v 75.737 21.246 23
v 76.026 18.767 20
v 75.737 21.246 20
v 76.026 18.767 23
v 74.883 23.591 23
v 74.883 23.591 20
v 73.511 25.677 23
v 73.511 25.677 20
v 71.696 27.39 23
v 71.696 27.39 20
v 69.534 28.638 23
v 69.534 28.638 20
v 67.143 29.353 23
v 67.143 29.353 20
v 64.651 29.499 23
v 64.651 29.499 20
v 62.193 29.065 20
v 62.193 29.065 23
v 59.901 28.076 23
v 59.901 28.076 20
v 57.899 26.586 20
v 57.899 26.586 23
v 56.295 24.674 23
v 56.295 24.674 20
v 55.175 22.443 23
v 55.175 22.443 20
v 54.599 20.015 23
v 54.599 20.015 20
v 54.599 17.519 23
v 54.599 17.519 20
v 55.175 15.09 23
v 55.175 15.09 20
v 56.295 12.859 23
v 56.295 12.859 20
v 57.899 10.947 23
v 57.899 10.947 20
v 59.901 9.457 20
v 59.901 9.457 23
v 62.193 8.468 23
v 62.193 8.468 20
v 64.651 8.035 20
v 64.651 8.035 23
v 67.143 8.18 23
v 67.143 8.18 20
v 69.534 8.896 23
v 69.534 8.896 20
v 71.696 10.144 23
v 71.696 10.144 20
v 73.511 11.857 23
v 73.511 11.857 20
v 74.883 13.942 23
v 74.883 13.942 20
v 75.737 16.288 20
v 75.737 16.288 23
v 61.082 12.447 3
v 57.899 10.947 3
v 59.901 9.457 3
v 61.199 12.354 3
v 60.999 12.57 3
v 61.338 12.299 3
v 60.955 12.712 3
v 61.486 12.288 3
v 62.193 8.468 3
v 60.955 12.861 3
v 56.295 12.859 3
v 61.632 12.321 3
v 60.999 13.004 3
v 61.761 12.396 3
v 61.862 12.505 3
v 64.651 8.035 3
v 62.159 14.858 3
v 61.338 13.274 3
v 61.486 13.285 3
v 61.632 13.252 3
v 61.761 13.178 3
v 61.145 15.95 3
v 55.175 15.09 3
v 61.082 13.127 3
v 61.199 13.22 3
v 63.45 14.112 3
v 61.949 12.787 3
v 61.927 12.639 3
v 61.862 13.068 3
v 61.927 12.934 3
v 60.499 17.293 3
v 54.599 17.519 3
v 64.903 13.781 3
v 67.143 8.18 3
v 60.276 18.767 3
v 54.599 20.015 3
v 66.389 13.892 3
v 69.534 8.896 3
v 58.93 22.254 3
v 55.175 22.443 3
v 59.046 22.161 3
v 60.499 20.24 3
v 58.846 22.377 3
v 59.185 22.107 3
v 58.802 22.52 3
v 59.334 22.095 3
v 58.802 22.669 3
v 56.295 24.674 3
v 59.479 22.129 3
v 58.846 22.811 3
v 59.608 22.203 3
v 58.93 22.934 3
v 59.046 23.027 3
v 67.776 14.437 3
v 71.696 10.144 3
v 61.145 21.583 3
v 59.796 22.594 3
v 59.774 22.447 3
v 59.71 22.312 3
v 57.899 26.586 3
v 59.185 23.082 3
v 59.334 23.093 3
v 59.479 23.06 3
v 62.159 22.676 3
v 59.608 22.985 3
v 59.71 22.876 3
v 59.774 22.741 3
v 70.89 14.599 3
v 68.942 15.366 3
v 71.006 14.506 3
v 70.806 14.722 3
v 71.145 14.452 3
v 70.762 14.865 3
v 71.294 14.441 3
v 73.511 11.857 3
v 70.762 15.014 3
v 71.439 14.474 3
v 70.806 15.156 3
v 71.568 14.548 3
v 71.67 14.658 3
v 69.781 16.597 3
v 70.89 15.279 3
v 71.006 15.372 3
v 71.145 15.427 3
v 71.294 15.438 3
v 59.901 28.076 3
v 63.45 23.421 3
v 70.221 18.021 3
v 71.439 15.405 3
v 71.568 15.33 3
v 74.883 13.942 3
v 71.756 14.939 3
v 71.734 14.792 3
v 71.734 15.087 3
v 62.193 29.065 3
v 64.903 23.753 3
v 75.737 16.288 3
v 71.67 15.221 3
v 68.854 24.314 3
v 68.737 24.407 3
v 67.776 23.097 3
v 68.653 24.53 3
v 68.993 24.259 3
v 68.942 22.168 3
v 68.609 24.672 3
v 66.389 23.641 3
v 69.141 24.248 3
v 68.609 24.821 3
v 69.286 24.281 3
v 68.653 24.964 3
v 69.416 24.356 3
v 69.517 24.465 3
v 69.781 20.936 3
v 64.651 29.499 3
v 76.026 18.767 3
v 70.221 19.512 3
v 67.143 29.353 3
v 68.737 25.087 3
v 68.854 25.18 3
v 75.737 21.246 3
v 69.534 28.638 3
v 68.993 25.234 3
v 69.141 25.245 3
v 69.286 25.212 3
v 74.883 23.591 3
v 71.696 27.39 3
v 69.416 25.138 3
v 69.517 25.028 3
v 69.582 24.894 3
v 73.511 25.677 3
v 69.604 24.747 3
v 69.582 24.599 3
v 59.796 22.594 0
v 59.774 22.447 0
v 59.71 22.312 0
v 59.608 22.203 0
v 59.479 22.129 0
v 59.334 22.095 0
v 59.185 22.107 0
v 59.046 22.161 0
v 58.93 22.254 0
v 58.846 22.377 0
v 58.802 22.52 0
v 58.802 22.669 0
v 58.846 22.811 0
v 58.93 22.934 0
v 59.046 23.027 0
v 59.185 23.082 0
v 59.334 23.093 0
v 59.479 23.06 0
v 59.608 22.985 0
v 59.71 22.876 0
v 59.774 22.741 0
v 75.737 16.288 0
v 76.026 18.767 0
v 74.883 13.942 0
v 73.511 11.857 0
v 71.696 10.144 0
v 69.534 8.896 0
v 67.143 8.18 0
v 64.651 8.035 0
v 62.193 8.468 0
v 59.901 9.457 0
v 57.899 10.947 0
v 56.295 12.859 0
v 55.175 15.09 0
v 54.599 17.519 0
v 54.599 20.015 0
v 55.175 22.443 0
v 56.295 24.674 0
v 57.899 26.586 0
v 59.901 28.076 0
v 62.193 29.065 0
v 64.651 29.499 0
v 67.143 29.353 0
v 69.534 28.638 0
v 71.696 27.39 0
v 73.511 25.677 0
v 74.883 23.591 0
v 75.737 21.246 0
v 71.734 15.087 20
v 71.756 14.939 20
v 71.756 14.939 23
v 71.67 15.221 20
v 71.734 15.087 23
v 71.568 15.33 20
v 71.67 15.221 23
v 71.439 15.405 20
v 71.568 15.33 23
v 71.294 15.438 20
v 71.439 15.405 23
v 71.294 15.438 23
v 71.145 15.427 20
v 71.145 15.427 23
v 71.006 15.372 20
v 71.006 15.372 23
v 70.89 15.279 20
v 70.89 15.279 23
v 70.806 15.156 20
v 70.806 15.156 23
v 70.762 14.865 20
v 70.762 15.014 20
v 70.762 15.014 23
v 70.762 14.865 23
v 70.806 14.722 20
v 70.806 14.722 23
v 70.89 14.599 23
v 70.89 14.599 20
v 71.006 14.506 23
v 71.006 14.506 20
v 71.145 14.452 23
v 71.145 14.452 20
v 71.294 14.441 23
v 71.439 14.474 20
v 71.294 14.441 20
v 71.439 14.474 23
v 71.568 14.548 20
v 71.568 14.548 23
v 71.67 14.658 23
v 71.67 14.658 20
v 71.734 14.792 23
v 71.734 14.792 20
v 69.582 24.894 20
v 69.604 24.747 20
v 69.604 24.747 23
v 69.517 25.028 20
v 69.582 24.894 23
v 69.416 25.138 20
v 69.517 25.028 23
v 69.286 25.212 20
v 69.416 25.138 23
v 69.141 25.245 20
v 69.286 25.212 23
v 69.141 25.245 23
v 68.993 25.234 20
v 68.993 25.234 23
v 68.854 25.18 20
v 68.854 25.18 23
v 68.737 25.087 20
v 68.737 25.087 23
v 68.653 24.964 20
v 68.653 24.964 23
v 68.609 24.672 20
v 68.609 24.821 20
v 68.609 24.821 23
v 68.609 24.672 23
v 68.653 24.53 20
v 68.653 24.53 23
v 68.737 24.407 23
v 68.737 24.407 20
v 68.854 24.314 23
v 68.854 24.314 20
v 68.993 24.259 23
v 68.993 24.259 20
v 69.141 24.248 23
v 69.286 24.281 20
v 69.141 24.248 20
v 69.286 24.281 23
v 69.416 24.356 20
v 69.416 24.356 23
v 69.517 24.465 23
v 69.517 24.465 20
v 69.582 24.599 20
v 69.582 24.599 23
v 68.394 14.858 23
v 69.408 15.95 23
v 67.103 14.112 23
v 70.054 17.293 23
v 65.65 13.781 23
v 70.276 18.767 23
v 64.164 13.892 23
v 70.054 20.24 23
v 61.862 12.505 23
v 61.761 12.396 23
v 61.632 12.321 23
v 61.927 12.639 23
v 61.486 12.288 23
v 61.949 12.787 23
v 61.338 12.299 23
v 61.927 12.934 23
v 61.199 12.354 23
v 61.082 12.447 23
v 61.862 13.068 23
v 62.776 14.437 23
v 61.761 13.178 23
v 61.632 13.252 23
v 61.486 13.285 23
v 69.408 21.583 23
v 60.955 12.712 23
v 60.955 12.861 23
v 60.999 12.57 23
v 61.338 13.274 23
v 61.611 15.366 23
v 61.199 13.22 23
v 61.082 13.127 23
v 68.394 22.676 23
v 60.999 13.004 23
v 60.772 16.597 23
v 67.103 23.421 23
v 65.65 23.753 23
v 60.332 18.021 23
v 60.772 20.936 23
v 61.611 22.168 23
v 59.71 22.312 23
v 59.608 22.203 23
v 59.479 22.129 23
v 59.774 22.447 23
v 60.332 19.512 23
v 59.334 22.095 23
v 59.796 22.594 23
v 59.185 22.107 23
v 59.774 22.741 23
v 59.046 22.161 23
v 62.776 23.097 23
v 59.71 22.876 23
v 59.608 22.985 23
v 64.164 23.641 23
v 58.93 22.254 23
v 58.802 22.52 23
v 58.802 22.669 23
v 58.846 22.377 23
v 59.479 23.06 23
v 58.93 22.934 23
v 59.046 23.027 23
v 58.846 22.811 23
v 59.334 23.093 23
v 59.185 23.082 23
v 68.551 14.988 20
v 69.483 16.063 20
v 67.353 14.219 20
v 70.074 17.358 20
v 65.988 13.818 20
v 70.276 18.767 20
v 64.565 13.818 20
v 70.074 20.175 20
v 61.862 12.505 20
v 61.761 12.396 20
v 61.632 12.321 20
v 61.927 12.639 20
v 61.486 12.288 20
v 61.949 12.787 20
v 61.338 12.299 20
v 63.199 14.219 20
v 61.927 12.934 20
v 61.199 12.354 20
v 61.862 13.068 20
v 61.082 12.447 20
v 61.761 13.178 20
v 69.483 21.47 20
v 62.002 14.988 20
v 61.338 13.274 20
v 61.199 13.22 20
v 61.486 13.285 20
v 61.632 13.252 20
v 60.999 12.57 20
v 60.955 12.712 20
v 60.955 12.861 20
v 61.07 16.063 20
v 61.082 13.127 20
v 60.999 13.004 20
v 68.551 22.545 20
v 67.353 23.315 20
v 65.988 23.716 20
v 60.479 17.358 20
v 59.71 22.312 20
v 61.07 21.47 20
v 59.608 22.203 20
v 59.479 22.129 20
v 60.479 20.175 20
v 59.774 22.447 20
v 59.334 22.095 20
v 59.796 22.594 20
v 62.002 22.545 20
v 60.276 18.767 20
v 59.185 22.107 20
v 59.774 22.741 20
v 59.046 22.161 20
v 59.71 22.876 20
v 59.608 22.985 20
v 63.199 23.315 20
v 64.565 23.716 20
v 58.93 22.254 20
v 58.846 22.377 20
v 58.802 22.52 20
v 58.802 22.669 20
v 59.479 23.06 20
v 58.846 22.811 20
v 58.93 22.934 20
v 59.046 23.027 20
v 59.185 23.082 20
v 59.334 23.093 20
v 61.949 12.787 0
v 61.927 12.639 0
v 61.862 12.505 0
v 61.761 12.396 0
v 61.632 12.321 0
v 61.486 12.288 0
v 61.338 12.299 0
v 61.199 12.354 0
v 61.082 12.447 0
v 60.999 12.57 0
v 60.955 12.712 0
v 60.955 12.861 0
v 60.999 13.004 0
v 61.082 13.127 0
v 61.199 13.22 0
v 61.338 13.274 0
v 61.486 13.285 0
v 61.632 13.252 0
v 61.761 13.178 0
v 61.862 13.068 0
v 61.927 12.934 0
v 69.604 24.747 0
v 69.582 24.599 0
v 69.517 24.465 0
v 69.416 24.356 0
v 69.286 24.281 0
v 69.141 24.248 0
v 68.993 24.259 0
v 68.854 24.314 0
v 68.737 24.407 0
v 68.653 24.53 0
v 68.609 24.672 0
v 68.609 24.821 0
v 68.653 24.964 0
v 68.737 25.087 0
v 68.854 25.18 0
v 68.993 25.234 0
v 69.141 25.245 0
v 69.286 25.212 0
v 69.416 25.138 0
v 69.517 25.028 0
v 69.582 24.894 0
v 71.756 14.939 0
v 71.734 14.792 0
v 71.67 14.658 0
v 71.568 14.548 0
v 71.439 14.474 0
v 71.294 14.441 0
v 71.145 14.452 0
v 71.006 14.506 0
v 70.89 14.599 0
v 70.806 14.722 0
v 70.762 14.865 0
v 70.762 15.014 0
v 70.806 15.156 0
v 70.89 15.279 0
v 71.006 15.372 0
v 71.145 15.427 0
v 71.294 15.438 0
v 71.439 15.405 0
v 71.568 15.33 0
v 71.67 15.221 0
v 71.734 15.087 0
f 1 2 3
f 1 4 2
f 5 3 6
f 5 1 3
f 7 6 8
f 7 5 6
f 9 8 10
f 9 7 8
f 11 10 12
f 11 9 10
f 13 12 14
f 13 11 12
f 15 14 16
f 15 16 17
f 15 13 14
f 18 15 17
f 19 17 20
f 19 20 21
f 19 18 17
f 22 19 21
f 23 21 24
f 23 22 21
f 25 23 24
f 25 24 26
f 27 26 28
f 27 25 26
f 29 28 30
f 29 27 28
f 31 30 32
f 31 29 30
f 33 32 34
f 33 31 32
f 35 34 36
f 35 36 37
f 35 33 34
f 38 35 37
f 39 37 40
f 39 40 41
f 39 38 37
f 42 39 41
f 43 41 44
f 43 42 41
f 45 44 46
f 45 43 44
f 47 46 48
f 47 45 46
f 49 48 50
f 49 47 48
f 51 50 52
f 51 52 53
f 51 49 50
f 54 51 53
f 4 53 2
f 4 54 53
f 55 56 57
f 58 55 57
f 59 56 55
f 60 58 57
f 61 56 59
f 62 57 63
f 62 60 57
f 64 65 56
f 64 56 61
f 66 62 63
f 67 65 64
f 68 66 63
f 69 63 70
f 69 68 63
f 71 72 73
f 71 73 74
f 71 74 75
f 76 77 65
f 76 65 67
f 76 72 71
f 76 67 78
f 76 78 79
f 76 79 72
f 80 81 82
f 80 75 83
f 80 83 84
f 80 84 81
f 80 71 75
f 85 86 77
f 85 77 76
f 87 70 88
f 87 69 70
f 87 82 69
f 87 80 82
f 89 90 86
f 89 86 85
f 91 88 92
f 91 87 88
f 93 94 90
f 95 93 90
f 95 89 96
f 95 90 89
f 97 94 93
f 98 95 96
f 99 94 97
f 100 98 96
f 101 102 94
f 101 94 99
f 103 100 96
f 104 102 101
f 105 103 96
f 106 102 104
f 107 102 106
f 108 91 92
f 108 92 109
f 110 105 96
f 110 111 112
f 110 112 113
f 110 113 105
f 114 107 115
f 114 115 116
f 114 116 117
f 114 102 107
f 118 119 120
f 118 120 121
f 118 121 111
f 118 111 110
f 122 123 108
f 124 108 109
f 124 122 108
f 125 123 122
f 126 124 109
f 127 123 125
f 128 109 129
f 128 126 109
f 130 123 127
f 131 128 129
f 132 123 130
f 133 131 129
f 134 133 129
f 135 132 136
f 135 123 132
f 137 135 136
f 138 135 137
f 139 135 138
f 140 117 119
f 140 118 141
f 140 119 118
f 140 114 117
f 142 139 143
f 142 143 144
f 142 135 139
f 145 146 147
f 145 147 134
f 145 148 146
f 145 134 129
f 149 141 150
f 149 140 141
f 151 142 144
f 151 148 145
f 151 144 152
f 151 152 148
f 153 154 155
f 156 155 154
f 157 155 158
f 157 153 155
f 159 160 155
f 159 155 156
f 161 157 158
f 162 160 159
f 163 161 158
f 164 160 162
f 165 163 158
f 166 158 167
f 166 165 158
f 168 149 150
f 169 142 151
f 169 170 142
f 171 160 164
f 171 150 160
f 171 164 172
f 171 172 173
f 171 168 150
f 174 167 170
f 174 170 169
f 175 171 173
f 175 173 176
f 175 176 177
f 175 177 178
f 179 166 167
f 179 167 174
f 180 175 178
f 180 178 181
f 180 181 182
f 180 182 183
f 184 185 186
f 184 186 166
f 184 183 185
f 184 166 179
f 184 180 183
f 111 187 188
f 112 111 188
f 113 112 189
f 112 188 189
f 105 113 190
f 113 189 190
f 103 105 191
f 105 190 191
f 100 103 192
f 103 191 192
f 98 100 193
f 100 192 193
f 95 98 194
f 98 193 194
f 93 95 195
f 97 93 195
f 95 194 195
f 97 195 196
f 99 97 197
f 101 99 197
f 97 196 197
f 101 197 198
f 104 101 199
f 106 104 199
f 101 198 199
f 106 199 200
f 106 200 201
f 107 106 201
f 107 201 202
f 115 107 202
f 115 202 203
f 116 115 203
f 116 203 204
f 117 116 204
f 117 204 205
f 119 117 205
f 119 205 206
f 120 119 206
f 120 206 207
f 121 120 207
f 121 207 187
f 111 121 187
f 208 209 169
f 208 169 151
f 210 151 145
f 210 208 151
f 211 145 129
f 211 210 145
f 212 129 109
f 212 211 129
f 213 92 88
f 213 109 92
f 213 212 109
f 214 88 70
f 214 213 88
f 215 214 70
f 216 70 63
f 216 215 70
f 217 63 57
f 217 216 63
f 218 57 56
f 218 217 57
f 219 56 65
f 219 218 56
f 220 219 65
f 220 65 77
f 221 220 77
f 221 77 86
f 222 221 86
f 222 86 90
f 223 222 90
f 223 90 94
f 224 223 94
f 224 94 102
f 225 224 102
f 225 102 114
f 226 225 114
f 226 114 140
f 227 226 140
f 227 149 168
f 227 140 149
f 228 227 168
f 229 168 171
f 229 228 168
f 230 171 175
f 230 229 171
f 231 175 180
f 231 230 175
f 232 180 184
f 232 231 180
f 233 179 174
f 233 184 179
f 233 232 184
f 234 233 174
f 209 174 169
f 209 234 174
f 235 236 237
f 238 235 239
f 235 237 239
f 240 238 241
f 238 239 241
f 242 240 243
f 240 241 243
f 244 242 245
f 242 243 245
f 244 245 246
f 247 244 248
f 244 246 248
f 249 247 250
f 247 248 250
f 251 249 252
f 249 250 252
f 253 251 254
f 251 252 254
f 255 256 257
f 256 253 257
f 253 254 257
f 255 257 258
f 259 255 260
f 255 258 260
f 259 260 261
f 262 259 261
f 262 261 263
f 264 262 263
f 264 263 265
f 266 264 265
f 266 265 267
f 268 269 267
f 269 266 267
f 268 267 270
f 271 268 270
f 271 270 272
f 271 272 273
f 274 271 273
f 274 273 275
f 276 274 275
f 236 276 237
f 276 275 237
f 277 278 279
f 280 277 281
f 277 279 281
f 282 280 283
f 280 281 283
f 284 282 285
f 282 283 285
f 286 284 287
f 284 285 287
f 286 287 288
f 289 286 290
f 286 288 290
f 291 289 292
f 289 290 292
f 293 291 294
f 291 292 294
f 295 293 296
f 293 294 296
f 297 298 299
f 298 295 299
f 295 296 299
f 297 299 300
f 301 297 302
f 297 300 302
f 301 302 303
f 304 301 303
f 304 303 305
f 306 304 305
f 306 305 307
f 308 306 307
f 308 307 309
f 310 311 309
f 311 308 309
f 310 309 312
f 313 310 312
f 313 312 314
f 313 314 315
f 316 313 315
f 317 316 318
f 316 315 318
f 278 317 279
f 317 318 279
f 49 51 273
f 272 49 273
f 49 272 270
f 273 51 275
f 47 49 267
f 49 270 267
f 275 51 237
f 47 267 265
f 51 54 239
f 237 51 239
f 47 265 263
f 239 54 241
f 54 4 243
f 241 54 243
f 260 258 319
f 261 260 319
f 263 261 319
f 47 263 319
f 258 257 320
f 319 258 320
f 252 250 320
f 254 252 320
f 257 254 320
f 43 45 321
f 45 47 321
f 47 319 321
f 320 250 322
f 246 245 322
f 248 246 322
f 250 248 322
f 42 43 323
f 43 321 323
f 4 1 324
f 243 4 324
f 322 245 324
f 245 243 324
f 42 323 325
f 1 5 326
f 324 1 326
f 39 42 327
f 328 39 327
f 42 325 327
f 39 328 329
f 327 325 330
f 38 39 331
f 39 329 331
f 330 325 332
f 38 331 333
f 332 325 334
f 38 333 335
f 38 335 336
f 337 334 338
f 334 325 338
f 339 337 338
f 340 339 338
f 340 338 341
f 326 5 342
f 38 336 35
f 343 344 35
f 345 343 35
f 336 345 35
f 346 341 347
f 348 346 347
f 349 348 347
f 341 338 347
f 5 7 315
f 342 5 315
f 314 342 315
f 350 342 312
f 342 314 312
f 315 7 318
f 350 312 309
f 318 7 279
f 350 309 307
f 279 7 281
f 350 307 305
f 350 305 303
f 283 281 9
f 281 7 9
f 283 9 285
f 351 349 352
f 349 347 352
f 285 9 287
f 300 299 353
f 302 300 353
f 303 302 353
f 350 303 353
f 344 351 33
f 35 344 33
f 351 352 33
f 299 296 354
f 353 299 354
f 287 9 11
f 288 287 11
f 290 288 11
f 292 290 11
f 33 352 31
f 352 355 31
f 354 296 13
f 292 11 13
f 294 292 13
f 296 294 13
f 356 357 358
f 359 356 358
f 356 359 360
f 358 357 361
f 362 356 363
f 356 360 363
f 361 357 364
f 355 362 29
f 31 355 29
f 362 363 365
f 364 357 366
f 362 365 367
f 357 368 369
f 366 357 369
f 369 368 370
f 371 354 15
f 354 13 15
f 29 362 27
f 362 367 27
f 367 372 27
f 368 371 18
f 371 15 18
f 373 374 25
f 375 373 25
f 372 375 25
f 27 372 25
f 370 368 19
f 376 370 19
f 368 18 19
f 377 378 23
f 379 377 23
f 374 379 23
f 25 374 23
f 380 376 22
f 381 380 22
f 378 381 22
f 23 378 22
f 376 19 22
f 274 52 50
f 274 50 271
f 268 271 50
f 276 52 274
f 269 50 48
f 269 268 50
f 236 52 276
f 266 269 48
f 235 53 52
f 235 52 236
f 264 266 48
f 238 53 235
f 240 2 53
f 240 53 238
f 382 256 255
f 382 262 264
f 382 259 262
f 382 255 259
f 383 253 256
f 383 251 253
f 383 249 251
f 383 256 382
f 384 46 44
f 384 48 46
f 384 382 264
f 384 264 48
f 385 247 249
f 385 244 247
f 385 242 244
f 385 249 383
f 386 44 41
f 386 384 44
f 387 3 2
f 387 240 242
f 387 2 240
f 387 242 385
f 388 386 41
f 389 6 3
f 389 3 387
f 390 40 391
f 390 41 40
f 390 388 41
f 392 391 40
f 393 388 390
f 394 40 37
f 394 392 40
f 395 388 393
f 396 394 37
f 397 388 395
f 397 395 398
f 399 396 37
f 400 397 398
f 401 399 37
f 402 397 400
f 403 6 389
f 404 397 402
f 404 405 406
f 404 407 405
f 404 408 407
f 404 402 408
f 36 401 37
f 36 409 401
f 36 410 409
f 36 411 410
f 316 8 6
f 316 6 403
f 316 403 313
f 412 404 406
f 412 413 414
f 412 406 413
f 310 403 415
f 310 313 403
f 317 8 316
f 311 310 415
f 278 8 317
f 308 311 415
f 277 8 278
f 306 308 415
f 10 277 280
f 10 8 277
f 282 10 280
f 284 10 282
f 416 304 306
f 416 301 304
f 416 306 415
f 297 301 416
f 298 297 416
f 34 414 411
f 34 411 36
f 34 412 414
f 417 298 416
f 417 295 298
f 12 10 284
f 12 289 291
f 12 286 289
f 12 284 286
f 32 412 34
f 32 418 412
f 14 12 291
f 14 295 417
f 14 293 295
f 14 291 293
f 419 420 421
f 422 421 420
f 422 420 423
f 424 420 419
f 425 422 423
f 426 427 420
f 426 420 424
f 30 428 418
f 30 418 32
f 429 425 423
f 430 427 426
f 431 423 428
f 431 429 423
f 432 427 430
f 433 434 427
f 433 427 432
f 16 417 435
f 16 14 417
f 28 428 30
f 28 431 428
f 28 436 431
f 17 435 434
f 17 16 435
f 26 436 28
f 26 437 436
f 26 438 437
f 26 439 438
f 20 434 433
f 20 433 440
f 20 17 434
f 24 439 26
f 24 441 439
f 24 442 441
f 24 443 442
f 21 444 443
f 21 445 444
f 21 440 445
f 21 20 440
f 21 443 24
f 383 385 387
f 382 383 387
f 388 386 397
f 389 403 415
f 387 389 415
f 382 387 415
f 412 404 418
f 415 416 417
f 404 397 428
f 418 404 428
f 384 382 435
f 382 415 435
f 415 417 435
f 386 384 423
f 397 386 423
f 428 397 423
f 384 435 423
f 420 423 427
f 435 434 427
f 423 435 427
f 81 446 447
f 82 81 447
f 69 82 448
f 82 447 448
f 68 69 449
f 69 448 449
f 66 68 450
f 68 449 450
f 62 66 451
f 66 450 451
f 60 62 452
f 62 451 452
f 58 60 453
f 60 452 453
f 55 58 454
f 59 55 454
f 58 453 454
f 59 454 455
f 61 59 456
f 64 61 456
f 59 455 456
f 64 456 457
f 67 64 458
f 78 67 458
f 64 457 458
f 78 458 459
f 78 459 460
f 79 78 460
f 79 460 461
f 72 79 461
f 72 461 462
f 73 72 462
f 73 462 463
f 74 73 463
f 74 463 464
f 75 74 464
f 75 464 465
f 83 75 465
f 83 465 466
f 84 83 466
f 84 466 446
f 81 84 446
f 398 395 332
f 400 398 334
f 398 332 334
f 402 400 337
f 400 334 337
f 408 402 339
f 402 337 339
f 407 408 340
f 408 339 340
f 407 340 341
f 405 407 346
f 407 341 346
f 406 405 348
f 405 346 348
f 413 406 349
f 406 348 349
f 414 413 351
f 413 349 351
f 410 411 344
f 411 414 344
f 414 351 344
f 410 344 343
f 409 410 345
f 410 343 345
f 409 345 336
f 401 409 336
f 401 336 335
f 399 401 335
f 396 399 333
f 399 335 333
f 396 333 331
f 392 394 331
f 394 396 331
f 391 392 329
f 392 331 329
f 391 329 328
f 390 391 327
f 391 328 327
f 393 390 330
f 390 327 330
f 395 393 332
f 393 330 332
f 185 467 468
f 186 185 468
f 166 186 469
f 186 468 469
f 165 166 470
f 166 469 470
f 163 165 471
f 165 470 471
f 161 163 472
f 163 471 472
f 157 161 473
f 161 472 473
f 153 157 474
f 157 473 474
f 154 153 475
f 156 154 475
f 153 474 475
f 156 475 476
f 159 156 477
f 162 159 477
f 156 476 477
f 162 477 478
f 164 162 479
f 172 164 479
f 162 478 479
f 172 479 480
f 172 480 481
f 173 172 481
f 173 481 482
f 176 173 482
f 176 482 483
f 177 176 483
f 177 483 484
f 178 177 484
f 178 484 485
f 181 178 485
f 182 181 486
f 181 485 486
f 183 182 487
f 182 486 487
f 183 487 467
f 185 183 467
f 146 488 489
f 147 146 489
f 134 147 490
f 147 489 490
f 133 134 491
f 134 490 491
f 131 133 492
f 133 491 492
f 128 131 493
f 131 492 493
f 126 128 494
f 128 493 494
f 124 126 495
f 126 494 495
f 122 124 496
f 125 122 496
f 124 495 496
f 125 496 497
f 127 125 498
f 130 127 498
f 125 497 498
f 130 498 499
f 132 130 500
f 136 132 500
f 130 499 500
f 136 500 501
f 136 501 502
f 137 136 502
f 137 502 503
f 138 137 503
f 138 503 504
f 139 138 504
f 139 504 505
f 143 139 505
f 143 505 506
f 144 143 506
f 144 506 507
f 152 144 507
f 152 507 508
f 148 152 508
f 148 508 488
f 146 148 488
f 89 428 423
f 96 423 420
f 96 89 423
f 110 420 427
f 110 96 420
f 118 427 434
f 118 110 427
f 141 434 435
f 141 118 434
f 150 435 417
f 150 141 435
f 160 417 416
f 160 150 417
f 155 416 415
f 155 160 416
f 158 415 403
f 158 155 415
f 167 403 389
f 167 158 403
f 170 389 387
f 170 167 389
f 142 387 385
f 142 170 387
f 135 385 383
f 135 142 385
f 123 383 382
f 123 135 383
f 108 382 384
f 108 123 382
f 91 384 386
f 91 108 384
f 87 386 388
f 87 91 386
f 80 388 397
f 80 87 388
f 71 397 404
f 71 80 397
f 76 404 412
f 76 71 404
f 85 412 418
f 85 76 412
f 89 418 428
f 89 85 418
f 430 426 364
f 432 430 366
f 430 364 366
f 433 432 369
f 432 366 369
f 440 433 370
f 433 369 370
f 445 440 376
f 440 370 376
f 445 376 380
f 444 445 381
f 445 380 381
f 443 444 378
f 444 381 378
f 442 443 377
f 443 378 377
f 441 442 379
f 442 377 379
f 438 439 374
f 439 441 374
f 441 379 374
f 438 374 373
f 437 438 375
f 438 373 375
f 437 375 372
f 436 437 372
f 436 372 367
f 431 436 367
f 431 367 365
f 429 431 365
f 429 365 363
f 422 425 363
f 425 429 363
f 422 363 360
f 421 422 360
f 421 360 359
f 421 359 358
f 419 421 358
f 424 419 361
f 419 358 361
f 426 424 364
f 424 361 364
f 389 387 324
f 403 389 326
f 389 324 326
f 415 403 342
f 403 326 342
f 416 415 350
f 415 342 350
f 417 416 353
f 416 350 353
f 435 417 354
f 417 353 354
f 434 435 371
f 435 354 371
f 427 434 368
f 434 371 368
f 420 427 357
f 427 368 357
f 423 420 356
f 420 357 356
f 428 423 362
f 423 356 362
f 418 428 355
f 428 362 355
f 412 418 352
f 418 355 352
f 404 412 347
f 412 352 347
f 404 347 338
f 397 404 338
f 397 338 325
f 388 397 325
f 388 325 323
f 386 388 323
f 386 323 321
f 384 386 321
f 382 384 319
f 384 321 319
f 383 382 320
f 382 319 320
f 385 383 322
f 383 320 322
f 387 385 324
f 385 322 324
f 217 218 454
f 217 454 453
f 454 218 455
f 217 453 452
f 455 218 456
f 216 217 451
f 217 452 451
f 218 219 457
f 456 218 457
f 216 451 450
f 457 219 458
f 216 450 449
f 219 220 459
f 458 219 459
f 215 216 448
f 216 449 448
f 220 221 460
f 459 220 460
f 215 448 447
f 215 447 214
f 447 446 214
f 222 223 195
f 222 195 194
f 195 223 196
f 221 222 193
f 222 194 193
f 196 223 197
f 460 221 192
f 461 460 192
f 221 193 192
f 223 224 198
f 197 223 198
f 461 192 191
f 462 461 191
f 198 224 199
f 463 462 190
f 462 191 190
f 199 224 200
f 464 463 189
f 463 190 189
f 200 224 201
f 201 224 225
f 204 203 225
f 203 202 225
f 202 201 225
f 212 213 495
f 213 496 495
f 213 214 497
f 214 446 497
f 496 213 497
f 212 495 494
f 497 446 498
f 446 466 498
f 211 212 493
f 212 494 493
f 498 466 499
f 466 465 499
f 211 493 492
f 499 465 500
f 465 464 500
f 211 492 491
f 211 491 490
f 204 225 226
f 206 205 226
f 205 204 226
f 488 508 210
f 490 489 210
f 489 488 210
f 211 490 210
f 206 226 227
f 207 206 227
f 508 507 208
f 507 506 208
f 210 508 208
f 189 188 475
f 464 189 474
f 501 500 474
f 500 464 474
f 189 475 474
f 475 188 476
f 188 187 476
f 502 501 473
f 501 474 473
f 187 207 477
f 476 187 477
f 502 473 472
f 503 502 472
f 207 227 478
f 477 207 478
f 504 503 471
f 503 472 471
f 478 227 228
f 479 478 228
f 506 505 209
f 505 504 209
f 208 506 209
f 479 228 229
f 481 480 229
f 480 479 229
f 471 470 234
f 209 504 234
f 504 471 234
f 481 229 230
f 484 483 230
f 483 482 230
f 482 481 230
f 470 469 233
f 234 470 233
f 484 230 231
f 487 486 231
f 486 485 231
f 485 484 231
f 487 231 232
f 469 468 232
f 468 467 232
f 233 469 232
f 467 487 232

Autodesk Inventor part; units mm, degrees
ref_plane "YZ Plane" through (0, 0, 0) normal (1, 0, 0) x (0, 1, 0)
ref_plane "XZ Plane" through (0, 0, 0) normal (0, 1, 0) x (-1, 0, 0)
ref_plane "XY Plane" through (0, 0, 0) normal (0, 0, 1) x (1, 0, 0)
sketch "Sketch1" plane through (0, 0, 0) normal (0, 0, 1) x (1, 0, 0)
  circle A0 centre (65.2764, 18.7667) radius 10.75 projected
  circle A1 centre (59.2964, 22.5941) radius 0.5 projected
  circle A2 centre (69.1038, 24.7468) radius 0.5 projected
  circle A3 centre (71.2565, 14.9393) radius 0.5 projected
  circle A4 centre (61.449, 12.7867) radius 0.5 projected
  circle A5 centre (65.2764, 18.7667) radius 7.1
  circle A6 centre (65.2764, 18.7667) radius 5
  point P0 (0, 0)
  dimension "d0" = 14.2
  dimension "d1" = 21.5
  dimension "d2" = 10
extrude "Extrusion1" add sketch "Sketch1" along normal blind 3 contours A0 | A1 A5 A2 A3 A4
sketch "Sketch2" plane through (65.2764, 18.7667, 0) normal (0, 0, -1) x (-1, 0, 0)
  circle A0 centre (0, 0) radius 5 projected
  point P0 (65.2764, -18.7667)
extrude "Extrusion2" add sketch "Sketch2" against normal blind 20
ref_plane "Work Plane1" through (65.2764, 18.7667, 11.5) normal (0, 0, 1) x (1, 0, 0)
mirror "Mirror1" about plane through (65.2764, 18.7667, 11.5) normal (0, 0, 1) of "Extrusion1"
properties part number "Pulley Mechanism"
